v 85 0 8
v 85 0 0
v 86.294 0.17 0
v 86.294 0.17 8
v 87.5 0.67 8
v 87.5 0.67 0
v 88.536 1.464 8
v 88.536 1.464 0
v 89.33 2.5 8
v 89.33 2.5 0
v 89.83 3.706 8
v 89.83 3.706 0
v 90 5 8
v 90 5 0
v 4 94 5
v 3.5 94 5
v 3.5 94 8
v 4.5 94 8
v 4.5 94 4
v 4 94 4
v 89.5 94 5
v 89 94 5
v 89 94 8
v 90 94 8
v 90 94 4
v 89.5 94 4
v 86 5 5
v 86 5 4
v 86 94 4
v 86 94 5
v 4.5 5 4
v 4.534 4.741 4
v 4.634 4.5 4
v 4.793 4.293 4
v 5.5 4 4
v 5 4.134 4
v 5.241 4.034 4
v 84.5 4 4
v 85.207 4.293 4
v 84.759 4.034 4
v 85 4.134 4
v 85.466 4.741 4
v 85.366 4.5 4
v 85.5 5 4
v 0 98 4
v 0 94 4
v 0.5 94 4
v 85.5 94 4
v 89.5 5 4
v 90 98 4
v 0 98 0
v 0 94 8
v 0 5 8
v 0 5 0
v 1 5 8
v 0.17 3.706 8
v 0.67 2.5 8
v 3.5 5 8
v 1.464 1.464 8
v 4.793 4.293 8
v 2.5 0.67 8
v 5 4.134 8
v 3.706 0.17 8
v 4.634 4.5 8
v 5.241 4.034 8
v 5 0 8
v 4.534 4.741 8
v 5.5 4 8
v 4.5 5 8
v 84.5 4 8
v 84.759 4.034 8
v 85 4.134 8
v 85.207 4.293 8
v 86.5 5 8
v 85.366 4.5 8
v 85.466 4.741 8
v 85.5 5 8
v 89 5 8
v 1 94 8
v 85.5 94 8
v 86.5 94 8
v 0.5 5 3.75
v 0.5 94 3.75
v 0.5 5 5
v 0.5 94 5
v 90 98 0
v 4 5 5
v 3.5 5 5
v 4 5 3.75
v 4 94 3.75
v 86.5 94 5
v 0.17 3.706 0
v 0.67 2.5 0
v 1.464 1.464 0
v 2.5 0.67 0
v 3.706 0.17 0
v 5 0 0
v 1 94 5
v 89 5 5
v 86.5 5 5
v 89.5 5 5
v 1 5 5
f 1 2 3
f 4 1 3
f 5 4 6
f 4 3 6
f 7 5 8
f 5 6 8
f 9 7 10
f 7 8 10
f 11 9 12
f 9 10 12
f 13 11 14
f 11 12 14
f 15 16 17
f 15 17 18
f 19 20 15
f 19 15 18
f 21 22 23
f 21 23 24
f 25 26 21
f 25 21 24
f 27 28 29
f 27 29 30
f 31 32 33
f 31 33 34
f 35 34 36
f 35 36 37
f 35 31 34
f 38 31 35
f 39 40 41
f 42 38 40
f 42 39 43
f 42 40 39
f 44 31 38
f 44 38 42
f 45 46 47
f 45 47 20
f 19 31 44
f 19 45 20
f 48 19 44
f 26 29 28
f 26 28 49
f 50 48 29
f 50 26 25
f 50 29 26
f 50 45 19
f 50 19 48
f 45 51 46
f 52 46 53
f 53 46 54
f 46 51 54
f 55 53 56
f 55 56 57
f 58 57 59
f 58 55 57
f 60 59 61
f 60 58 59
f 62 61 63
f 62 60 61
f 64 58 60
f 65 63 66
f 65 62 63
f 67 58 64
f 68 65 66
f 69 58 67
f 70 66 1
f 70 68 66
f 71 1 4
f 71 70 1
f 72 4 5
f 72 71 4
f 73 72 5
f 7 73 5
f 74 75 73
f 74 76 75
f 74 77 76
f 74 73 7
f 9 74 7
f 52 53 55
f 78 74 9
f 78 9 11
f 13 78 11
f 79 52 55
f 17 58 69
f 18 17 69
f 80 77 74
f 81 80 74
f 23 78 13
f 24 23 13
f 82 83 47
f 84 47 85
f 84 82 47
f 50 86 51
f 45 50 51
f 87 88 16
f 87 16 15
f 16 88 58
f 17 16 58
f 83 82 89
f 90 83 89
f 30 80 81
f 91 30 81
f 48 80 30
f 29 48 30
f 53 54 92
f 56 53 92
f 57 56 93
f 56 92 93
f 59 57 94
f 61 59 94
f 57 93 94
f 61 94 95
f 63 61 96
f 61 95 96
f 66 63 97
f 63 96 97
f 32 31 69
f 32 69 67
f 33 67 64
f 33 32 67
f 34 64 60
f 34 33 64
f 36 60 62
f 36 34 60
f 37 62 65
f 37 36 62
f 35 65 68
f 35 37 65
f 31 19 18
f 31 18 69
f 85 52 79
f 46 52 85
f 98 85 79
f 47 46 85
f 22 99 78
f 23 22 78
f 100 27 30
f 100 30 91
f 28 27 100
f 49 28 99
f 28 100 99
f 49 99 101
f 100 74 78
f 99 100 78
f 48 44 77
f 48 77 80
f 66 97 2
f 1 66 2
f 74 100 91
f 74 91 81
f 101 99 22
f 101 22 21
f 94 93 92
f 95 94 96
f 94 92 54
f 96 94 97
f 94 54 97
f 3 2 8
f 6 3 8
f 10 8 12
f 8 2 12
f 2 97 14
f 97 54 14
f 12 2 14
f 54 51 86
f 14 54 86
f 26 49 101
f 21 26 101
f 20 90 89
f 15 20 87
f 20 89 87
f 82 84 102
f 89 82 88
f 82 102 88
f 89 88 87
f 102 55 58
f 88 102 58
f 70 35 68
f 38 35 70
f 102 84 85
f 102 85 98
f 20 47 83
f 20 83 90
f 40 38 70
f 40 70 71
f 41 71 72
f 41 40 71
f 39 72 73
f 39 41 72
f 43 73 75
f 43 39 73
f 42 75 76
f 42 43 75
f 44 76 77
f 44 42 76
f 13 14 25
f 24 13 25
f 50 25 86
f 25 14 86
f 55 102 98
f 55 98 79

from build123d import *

# Parameters (mm, degrees)
EXTRUDE_DEPTH   = 4
PAD_DEPTH       = 8
POCKET_START    = 4
SKETCH001_W     = 90
SKETCH001_H     = 4
POCKET_DEPTH    = 4
POCKET001_START = -5
SKETCH002_W     = 3.5
SKETCH002_H     = 1
SKETCH002_W_2   = 2.5
SKETCH002_H_2   = 3
SKETCH002_H_3   = 1.25
POCKET001_DEPTH = 89


with BuildPart() as part:
    # Face001 → Extrude (new body)
    with BuildSketch(Plane(origin=(44.07068, 49.485801, 0), x_dir=(0, 1, 0), z_dir=(0, 0, 1))):
        with BuildLine():
            add(Edge.make_bspline(
                [(-12.189347, 20.903638), (-8.616149, 10.816398)],
                knots=[0, 0, 8.089254, 8.089254], degree=1))
            add(Edge.make_bspline(
                [(-8.616149, 10.816398), (-9.34243, 10.514773)],
                knots=[0, 0, 0.594462, 0.594462], degree=1))
            add(Edge.make_bspline(
                [(-9.34243, 10.514773), (-9.595107, 10.410263), (-9.751211, 10.165523), (-9.751211, 9.903586)],
                knots=[0, 0, 0, 0, 1, 1, 1, 1], degree=3))
            add(Edge.make_bspline(
                [(-9.751211, 9.903586), (-9.751211, 9.842732), (-9.743274, 9.781877), (-9.724753, 9.7197)],
                knots=[0, 0, 0, 0, 1, 1, 1, 1], degree=3))
            add(Edge.make_bspline(
                [(-9.724753, 9.7197), (-6.950597, 0.094159)],
                knots=[0, 0, 7.572159, 7.572159], degree=1))
            add(Edge.make_bspline(
                [(-6.950597, 0.094159), (-7.703336, -0.194237)],
                knots=[0, 0, 0.609332, 0.609332], degree=1))
            add(Edge.make_bspline(
                [(-7.703336, -0.194237), (-7.963951, -0.292133), (-8.127992, -0.542164), (-8.127992, -0.809393)],
                knots=[0, 0, 0, 0, 1, 1, 1, 1], degree=3))
            add(Edge.make_bspline(
                [(-8.127992, -0.809393), (-8.127992, -0.874216), (-8.118732, -0.939039), (-8.098888, -1.003862)],
                knots=[0, 0, 0, 0, 1, 1, 1, 1], degree=3))
            add(Edge.make_bspline(
                [(-8.098888, -1.003862), (-2.807222, -18.201779)],
                knots=[0, 0, 13.601471, 13.601471], degree=1))
            add(Edge.make_bspline(
                [(-2.807222, -18.201779), (-2.752982, -18.37905), (-2.627305, -18.524571), (-2.460617, -18.603946)],
                knots=[0, 0, 0, 0, 1, 1, 1, 1], degree=3))
            add(Edge.make_bspline(
                [(-2.460617, -18.603946), (-2.29393, -18.683321), (-2.100784, -18.689935), (-1.930128, -18.621143)],
                knots=[0, 0, 0, 0, 1, 1, 1, 1], degree=3))
            add(Edge.make_bspline(
                [(-1.930128, -18.621143), (14.607653, -12.00656)],
                knots=[0, 0, 13.46384, 13.46384], degree=1))
            add(Edge.make_bspline(
                [(14.607653, -12.00656), (14.782278, -11.936446), (14.918539, -11.796216), (14.983362, -11.620268)],
                knots=[0, 0, 0, 0, 1, 1, 1, 1], degree=3))
            add(Edge.make_bspline(
                [(14.983362, -11.620268), (15.046862, -11.444321), (15.034956, -11.248529), (14.947643, -11.083164)],
                knots=[0, 0, 0, 0, 1, 1, 1, 1], degree=3))
            add(Edge.make_bspline(
                [(14.947643, -11.083164), (6.637081, 4.667482)],
                knots=[0, 0, 13.461663, 13.461663], degree=1))
            add(Edge.make_bspline(
                [(6.637081, 4.667482), (6.480976, 4.963815), (6.127758, 5.096107), (5.815549, 4.975721)],
                knots=[0, 0, 0, 0, 1, 1, 1, 1], degree=3))
            add(Edge.make_bspline(
                [(5.815549, 4.975721), (4.96756, 4.651607)],
                knots=[0, 0, 0.686226, 0.686226], degree=1))
            add(Edge.make_bspline(
                [(4.96756, 4.651607), (-0.018513, 13.744013)],
                knots=[0, 0, 7.83859, 7.83859], degree=1))
            add(Edge.make_bspline(
                [(-0.018513, 13.744013), (-0.181232, 14.041669), (-0.541065, 14.167346), (-0.851951, 14.0377)],
                knots=[0, 0, 0, 0, 1, 1, 1, 1], degree=3))
            add(Edge.make_bspline(
                [(-0.851951, 14.0377), (-1.578232, 13.736075)],
                knots=[0, 0, 0.594462, 0.594462], degree=1))
            add(Edge.make_bspline(
                [(-1.578232, 13.736075), (-6.192565, 23.392044)],
                knots=[0, 0, 8.089595, 8.089595], degree=1))
            add(Edge.make_bspline(
                [(-6.192565, 23.392044), (-6.344701, 23.709544), (-6.717763, 23.852419), (-7.043201, 23.717482)],
                knots=[0, 0, 0, 0, 1, 1, 1, 1], degree=3))
            add(Edge.make_bspline(
                [(-7.043201, 23.717482), (-11.81893, 21.735752)],
                knots=[0, 0, 3.908466, 3.908466], degree=1))
            add(Edge.make_bspline(
                [(-11.81893, 21.735752), (-12.07293, 21.629919), (-12.227711, 21.385179), (-12.227711, 21.124565)],
                knots=[0, 0, 0, 0, 1, 1, 1, 1], degree=3))
            add(Edge.make_bspline(
                [(-12.227711, 21.124565), (-12.227711, 21.050482), (-12.215805, 20.976398), (-12.189347, 20.903638)],
                knots=[0, 0, 0, 0, 1, 1, 1, 1], degree=3))
        make_face()
        with BuildLine():
            add(Edge.make_bspline(
                [(-24.664451, 2.497898), (-24.664451, 2.132773), (-24.368117, 1.83644), (-24.002992, 1.83644)],
                knots=[0, 0, 0, 0, 1, 1, 1, 1], degree=3))
            add(Edge.make_bspline(
                [(-24.002992, 1.83644), (-15.404034, 1.83644)],
                knots=[0, 0, 6.5, 6.5], degree=1))
            add(Edge.make_bspline(
                [(-15.404034, 1.83644), (-15.404034, -1.166581)],
                knots=[0, 0, 2.27, 2.27], degree=1))
            add(Edge.make_bspline(
                [(-15.404034, -1.166581), (-24.43294, -8.905643)],
                knots=[0, 0, 8.989056, 8.989056], degree=1))
            add(Edge.make_bspline(
                [(-24.43294, -8.905643), (-24.586399, -9.036612), (-24.664451, -9.221821), (-24.664451, -9.408352)],
                knots=[0, 0, 0, 0, 1, 1, 1, 1], degree=3))
            add(Edge.make_bspline(
                [(-24.664451, -9.408352), (-24.664451, -9.560487), (-24.611534, -9.713946), (-24.504378, -9.8383)],
                knots=[0, 0, 0, 0, 1, 1, 1, 1], degree=3))
            add(Edge.make_bspline(
                [(-24.504378, -9.8383), (-24.266253, -10.116112), (-23.849534, -10.147862), (-23.571722, -9.909737)],
                knots=[0, 0, 0, 0, 1, 1, 1, 1], degree=3))
            add(Edge.make_bspline(
                [(-23.571722, -9.909737), (-14.497836, -2.13231)],
                knots=[0, 0, 9.033744, 9.033744], degree=1))
            add(Edge.make_bspline(
                [(-14.497836, -2.13231), (-12.857419, -2.13231)],
                knots=[0, 0, 1.24, 1.24], degree=1))
            add(Edge.make_bspline(
                [(-12.857419, -2.13231), (-11.318867, -2.13231), (-10.112367, -0.970789), (-10.112367, 0.513523)],
                knots=[0, 0, 0, 0, 1, 1, 1, 1], degree=3))
            add(Edge.make_bspline(
                [(-10.112367, 0.513523), (-10.112367, 4.482273)],
                knots=[0, 0, 3, 3], degree=1))
            add(Edge.make_bspline(
                [(-10.112367, 4.482273), (-10.112367, 5.990398), (-11.250076, 7.128107), (-12.758201, 7.128107)],
                knots=[0, 0, 0, 0, 1, 1, 1, 1], degree=3))
            add(Edge.make_bspline(
                [(-12.758201, 7.128107), (-14.497836, 7.128107)],
                knots=[0, 0, 1.315, 1.315], degree=1))
            add(Edge.make_bspline(
                [(-14.497836, 7.128107), (-23.571722, 14.905534)],
                knots=[0, 0, 9.033744, 9.033744], degree=1))
            add(Edge.make_bspline(
                [(-23.571722, 14.905534), (-23.848211, 15.143659), (-24.266253, 15.111909), (-24.504378, 14.834096)],
                knots=[0, 0, 0, 0, 1, 1, 1, 1], degree=3))
            add(Edge.make_bspline(
                [(-24.504378, 14.834096), (-24.611534, 14.709742), (-24.664451, 14.556284), (-24.664451, 14.404148)],
                knots=[0, 0, 0, 0, 1, 1, 1, 1], degree=3))
            add(Edge.make_bspline(
                [(-24.664451, 14.404148), (-24.664451, 14.217617), (-24.586399, 14.032409), (-24.43294, 13.902763)],
                knots=[0, 0, 0, 0, 1, 1, 1, 1], degree=3))
            add(Edge.make_bspline(
                [(-24.43294, 13.902763), (-15.404034, 6.162377)],
                knots=[0, 0, 8.989707, 8.989707], degree=1))
            add(Edge.make_bspline(
                [(-15.404034, 6.162377), (-15.404034, 3.159357)],
                knots=[0, 0, 2.27, 2.27], degree=1))
            add(Edge.make_bspline(
                [(-15.404034, 3.159357), (-24.002992, 3.159357)],
                knots=[0, 0, 6.5, 6.5], degree=1))
            add(Edge.make_bspline(
                [(-24.002992, 3.159357), (-24.368117, 3.159357), (-24.664451, 2.863023), (-24.664451, 2.497898)],
                knots=[0, 0, 0, 0, 1, 1, 1, 1], degree=3))
        make_face()
        with BuildLine():
            add(Edge.make_bspline(
                [(17.253487, -13.990935), (17.593476, -13.854675), (17.757518, -13.468383), (17.622581, -13.131039)],
                knots=[0, 0, 0, 0, 1, 1, 1, 1], degree=3))
            add(Edge.make_bspline(
                [(17.622581, -13.131039), (17.48632, -12.792373), (17.101351, -12.627008), (16.762685, -12.761946)],
                knots=[0, 0, 0, 0, 1, 1, 1, 1], degree=3))
            add(Edge.make_bspline(
                [(16.762685, -12.761946), (-3.081065, -20.699446)],
                knots=[0, 0, 16.155494, 16.155494], degree=1))
            add(Edge.make_bspline(
                [(-3.081065, -20.699446), (-3.340357, -20.803956), (-3.497784, -21.052664), (-3.497784, -21.314602)],
                knots=[0, 0, 0, 0, 1, 1, 1, 1], degree=3))
            add(Edge.make_bspline(
                [(-3.497784, -21.314602), (-3.497784, -21.396623), (-3.483232, -21.479966), (-3.450159, -21.560664)],
                knots=[0, 0, 0, 0, 1, 1, 1, 1], degree=3))
            add(Edge.make_bspline(
                [(-3.450159, -21.560664), (-3.313899, -21.899331), (-2.92893, -22.064696), (-2.590263, -21.929758)],
                knots=[0, 0, 0, 0, 1, 1, 1, 1], degree=3))
            add(Edge.make_bspline(
                [(-2.590263, -21.929758), (17.253487, -13.990935)],
                knots=[0, 0, 16.155866, 16.155866], degree=1))
        make_face()
    extrude(amount=EXTRUDE_DEPTH)


with BuildPart() as part_1:
    # Extrude placement: moved
    add(part.part.moved(Location((2.348148, 3.053205, -2))))


with BuildPart() as part_2:
    # BaseFeature placement: moved
    add(part_1.part.moved(Location((-2.348148, -3.053205, 2))))

    # Sketch → Pad (new body)
    with BuildSketch(Plane.XY):
        with BuildLine():
            Line((0, 98), (0, 5))
            ThreePointArc((0, 5), (1.464466, 1.464466), (5, 0))
            Line((5, 0), (85, 0))
            ThreePointArc((85, 0), (88.535534, 1.464466), (90, 5))
            Line((90, 5), (90, 98))
            Line((90, 98), (0, 98))
        make_face()
    extrude(amount=PAD_DEPTH)

    # Sketch001 → Pocket (cut)
    with BuildSketch(Plane.XY.offset(POCKET_START)):
        with BuildLine():
            Line((4.5, 98), (4.5, 5))
            ThreePointArc((4.5, 5), (4.792893, 4.292893), (5.5, 4))
            Line((5.5, 4), (84.5, 4))
            ThreePointArc((84.5, 4), (85.207107, 4.292893), (85.5, 5))
            Line((85.5, 5), (85.5, 98))
            Line((85.5, 98), (4.5, 98))
        make_face()
        with Locations((45, 96)):
            Rectangle(SKETCH001_W, SKETCH001_H)
    extrude(amount=POCKET_DEPTH, mode=Mode.SUBTRACT)

    # Sketch002 → Pocket001 (cut)
    with BuildSketch(Plane.XZ.offset(POCKET001_START)):
        with Locations((87.75, 4.5)):
            Rectangle(SKETCH002_W, SKETCH002_H)
        with Locations((87.75, 6.5)):
            Rectangle(SKETCH002_W_2, SKETCH002_H_2)
        with Locations((2.25, 4.375)):
            Rectangle(SKETCH002_W, SKETCH002_H_3)
        with Locations((2.25, 6.5)):
            Rectangle(SKETCH002_W_2, SKETCH002_H_2)
    extrude(amount=-POCKET001_DEPTH, mode=Mode.SUBTRACT)


solid = part_2.part
